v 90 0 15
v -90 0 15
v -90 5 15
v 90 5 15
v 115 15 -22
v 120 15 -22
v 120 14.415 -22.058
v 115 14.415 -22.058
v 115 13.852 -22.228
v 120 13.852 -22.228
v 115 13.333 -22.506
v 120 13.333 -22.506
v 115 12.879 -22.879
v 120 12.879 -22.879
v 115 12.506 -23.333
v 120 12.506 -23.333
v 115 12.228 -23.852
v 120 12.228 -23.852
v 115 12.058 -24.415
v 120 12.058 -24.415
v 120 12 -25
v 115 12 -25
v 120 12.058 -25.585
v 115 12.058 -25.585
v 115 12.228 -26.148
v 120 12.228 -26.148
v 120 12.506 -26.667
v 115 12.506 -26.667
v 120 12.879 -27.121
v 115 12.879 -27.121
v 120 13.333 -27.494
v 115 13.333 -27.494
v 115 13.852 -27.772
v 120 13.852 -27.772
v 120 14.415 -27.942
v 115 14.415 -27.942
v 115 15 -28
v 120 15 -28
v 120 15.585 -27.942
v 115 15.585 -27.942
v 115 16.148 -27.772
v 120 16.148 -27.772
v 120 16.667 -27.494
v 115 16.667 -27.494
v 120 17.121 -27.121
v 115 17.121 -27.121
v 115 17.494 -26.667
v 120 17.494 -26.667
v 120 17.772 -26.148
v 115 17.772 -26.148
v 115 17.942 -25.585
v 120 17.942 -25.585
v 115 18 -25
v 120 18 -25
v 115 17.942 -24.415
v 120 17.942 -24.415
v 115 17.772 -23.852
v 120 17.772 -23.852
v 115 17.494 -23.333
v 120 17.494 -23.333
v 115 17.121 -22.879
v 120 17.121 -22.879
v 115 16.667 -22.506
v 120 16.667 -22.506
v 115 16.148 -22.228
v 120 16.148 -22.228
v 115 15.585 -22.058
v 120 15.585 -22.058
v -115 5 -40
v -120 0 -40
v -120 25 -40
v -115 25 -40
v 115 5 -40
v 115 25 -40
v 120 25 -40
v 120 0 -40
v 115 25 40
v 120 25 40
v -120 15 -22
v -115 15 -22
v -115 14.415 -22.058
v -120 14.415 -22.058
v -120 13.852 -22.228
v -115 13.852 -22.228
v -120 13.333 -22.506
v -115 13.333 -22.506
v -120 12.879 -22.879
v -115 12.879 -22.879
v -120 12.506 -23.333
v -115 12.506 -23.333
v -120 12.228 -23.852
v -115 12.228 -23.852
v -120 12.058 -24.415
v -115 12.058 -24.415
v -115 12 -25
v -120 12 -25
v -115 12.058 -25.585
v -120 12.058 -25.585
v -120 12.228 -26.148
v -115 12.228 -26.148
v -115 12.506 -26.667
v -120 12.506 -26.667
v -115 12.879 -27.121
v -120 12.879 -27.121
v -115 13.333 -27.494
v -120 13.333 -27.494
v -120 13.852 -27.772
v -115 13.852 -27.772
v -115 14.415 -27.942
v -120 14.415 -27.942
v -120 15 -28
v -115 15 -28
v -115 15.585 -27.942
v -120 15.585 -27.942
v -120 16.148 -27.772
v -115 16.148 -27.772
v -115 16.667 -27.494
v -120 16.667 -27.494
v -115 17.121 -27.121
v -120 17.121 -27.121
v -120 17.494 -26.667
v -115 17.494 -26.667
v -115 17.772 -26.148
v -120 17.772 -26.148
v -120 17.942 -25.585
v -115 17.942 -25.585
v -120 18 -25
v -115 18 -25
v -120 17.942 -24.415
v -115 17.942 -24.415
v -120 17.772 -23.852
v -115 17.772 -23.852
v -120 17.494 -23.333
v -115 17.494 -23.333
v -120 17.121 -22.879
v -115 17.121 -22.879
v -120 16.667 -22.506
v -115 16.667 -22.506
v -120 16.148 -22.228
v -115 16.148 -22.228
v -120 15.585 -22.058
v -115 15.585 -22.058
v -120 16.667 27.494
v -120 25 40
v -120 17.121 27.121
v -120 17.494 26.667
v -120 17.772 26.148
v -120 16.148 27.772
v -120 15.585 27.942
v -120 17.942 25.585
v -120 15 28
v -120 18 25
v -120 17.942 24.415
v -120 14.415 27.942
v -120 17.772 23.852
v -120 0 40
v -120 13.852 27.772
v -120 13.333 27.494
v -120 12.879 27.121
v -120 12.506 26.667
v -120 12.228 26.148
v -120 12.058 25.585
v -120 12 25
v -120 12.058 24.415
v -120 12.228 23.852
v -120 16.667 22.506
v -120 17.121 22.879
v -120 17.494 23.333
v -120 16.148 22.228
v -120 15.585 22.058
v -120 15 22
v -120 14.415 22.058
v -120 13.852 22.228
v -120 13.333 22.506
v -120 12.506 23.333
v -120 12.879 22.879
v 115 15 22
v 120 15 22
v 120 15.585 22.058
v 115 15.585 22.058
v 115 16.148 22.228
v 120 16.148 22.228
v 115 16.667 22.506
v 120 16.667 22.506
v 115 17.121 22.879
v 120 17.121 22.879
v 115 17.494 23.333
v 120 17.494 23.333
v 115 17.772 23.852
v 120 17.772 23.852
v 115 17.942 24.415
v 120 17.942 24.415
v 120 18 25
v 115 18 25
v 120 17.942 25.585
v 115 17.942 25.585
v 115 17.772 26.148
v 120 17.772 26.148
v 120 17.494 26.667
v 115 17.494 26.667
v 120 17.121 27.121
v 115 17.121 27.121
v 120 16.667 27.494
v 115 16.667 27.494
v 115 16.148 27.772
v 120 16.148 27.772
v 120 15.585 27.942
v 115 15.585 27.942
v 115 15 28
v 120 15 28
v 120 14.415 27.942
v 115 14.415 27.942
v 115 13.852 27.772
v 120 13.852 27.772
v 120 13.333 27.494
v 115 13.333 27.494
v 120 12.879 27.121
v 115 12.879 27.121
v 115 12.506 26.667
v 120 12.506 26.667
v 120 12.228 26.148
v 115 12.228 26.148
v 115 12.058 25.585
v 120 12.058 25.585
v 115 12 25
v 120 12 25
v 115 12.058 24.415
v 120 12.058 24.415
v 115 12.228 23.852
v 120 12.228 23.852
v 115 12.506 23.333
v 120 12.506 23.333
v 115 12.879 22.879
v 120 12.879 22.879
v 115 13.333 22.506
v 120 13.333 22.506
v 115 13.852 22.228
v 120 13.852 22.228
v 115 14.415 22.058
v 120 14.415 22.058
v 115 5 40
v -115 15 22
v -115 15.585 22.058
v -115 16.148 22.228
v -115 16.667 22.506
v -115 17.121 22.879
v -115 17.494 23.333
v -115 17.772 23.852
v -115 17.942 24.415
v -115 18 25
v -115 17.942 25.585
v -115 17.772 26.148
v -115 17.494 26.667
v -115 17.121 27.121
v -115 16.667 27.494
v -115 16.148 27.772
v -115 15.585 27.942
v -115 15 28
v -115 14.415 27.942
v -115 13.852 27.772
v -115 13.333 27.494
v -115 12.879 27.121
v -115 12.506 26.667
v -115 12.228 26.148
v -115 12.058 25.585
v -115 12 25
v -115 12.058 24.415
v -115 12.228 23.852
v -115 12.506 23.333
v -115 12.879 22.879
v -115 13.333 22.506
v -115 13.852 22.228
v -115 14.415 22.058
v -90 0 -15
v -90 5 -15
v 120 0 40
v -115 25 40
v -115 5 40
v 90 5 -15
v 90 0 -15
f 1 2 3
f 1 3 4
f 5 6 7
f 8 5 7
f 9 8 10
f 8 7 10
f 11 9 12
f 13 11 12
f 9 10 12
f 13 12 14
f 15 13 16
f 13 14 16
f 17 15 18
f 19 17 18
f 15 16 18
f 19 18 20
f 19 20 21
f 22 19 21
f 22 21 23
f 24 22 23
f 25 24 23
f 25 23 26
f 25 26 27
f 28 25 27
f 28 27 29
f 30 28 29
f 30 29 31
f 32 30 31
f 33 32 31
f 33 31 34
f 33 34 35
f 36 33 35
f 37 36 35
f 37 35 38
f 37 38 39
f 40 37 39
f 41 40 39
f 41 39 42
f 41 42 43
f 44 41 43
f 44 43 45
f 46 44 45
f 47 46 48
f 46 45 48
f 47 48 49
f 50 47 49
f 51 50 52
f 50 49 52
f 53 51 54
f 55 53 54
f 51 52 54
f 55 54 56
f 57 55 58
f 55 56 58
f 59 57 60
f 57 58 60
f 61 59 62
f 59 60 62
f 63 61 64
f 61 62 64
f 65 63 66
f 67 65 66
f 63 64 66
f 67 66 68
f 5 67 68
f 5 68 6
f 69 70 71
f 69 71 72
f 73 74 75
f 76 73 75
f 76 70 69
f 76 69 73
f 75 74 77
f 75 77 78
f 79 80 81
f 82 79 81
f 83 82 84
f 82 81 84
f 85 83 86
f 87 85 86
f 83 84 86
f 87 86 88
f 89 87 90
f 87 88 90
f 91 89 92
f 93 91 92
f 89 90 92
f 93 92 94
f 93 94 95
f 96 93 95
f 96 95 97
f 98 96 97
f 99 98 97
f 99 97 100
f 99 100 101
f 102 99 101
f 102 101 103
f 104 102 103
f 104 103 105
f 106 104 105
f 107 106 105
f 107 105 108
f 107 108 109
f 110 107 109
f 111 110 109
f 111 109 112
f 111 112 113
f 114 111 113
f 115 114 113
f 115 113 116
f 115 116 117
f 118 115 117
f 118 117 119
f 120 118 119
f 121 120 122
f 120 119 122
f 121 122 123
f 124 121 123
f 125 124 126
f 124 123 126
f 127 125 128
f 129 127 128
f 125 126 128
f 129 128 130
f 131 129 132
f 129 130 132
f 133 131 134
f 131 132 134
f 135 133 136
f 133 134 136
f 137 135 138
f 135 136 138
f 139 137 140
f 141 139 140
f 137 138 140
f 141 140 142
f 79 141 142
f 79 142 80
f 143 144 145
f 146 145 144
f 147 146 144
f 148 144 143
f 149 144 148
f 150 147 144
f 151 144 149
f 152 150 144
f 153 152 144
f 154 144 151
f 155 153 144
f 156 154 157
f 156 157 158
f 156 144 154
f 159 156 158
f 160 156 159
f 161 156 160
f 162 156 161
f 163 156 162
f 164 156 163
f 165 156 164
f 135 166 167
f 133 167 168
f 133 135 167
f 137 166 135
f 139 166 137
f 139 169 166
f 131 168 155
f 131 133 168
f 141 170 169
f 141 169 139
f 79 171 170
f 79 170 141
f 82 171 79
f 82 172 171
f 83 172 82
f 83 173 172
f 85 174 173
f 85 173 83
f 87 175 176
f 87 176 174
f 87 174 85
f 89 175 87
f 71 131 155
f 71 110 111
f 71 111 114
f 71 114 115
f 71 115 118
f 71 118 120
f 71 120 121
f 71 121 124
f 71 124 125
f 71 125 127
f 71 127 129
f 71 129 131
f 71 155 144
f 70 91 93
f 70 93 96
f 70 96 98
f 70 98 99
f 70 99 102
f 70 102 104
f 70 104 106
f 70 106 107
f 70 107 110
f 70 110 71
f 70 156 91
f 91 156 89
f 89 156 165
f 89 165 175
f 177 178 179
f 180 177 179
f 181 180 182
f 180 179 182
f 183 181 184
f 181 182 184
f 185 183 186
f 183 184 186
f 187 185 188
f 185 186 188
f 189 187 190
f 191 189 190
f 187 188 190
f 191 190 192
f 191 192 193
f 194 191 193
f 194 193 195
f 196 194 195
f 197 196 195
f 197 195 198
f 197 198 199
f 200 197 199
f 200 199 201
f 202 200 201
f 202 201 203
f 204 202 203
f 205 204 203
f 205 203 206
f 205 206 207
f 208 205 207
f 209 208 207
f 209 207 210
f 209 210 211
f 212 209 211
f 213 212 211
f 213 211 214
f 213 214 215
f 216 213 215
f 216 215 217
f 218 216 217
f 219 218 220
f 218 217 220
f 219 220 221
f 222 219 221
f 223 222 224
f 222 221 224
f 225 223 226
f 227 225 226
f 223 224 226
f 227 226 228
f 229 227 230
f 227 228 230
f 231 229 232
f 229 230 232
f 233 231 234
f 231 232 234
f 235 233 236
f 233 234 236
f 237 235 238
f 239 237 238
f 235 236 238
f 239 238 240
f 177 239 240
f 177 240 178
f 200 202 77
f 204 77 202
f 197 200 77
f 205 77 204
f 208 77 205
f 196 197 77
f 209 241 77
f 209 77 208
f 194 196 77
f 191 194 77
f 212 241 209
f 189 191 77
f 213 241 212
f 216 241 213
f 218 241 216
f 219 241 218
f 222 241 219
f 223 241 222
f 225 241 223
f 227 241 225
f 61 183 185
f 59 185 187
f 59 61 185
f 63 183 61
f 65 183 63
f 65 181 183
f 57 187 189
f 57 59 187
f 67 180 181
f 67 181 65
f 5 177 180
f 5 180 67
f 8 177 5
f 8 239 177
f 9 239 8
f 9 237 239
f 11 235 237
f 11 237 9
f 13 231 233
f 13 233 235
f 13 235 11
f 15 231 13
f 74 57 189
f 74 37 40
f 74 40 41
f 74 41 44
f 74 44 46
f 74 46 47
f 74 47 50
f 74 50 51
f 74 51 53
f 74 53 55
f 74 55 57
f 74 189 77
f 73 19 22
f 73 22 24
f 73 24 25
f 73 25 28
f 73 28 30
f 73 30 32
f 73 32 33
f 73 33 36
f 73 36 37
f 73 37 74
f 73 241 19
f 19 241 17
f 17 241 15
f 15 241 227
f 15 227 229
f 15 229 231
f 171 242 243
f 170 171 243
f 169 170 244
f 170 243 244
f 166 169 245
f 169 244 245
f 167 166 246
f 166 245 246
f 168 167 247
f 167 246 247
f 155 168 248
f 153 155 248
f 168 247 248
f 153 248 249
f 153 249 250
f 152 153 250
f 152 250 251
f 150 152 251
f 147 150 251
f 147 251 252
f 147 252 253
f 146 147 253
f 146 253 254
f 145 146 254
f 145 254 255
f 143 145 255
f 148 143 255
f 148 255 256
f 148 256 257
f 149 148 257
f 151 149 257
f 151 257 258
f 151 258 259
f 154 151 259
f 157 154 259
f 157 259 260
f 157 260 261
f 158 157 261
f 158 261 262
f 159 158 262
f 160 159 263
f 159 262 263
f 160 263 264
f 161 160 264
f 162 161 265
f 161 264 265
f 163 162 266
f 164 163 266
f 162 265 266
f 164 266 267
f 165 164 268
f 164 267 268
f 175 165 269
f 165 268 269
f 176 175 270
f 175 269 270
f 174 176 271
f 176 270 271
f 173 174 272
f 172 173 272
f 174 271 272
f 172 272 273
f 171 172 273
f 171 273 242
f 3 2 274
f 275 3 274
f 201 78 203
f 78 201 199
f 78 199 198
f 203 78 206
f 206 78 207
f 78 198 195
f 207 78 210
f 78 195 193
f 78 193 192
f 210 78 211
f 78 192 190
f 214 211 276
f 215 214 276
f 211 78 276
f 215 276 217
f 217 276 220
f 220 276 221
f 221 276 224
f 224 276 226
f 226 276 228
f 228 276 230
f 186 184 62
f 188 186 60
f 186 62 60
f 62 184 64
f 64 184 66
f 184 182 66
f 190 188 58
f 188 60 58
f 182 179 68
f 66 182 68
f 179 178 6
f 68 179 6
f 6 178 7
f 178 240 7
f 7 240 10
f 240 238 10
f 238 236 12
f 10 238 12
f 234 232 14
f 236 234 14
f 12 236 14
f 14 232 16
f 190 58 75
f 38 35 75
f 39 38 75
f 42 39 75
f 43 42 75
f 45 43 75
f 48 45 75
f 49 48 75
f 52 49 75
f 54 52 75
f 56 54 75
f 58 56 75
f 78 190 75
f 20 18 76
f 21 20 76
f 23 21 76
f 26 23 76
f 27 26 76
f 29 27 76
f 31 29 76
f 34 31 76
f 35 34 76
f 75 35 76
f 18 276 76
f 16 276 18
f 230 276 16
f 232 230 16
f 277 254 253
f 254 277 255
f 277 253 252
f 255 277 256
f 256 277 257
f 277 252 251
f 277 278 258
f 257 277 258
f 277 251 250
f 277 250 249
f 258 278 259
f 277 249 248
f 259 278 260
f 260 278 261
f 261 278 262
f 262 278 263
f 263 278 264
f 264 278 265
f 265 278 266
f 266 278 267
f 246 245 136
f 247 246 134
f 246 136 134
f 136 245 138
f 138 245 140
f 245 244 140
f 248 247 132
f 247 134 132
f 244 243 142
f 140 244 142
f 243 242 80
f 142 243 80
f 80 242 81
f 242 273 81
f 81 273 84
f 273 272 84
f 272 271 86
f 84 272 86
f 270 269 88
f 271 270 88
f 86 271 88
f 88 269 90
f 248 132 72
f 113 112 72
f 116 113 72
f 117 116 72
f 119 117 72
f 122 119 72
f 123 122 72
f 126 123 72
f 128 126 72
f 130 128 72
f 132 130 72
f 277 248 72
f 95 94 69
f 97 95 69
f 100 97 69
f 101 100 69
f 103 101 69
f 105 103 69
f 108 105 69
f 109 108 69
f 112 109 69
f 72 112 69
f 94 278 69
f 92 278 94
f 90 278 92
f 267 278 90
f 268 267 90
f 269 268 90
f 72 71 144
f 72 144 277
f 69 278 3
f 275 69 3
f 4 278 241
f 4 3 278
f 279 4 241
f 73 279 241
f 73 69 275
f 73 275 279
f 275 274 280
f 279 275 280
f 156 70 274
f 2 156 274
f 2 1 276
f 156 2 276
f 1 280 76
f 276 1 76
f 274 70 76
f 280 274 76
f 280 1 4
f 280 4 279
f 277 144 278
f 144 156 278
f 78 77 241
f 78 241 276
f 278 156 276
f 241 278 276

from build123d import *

# Parameters (mm, degrees)
SKETCH1_W           = 240
SKETCH1_H           = 80
SKETCH1_W_2         = 180
SKETCH1_H_2         = 30
BOSS_EXTRUDE1_DEPTH = 5
SKETCH2_W           = 5
SKETCH2_H           = 80
BOSS_EXTRUDE2_DEPTH = 20
SKETCH4_W           = 5
SKETCH4_H           = 80
BOSS_EXTRUDE3_DEPTH = 20
SKETCH3_R           = 3
CUT_EXTRUDE1_DEPTH  = 245.591496173


with BuildPart() as part:
    # Sketch1 → Boss-Extrude1 (new body)
    with BuildSketch(Plane(origin=(0, 0, 0), x_dir=(1, 0, 0), z_dir=(0, 1, 0))):
        Rectangle(SKETCH1_W, SKETCH1_H)
        Rectangle(SKETCH1_W_2, SKETCH1_H_2, mode=Mode.SUBTRACT)
    extrude(amount=BOSS_EXTRUDE1_DEPTH)

    # Sketch2 → Boss-Extrude2 (add)
    with BuildSketch(Plane(origin=(0, 5, 0), x_dir=(1, 0, 0), z_dir=(0, 1, 0))):
        with Locations((117.5, 0)):
            Rectangle(SKETCH2_W, SKETCH2_H)
    extrude(amount=BOSS_EXTRUDE2_DEPTH)

    # Sketch4 → Boss-Extrude3 (add)
    with BuildSketch(Plane(origin=(0, 5, 0), x_dir=(1, 0, 0), z_dir=(0, 1, 0))):
        with Locations((-117.5, 0)):
            Rectangle(SKETCH4_W, SKETCH4_H)
    extrude(amount=BOSS_EXTRUDE3_DEPTH)

    # Sketch3 → Cut-Extrude1 (cut, through all)
    with BuildSketch(Plane(origin=(120, 0, 0), x_dir=(0, 0, -1), z_dir=(1, 0, 0))):
        with Locations((-25, 15)):
            Circle(SKETCH3_R)
        with Locations(Location((25, 15, 0), (0, 0, 180))):
            Circle(SKETCH3_R)
    extrude(amount=-CUT_EXTRUDE1_DEPTH, mode=Mode.SUBTRACT)


solid = part.part
